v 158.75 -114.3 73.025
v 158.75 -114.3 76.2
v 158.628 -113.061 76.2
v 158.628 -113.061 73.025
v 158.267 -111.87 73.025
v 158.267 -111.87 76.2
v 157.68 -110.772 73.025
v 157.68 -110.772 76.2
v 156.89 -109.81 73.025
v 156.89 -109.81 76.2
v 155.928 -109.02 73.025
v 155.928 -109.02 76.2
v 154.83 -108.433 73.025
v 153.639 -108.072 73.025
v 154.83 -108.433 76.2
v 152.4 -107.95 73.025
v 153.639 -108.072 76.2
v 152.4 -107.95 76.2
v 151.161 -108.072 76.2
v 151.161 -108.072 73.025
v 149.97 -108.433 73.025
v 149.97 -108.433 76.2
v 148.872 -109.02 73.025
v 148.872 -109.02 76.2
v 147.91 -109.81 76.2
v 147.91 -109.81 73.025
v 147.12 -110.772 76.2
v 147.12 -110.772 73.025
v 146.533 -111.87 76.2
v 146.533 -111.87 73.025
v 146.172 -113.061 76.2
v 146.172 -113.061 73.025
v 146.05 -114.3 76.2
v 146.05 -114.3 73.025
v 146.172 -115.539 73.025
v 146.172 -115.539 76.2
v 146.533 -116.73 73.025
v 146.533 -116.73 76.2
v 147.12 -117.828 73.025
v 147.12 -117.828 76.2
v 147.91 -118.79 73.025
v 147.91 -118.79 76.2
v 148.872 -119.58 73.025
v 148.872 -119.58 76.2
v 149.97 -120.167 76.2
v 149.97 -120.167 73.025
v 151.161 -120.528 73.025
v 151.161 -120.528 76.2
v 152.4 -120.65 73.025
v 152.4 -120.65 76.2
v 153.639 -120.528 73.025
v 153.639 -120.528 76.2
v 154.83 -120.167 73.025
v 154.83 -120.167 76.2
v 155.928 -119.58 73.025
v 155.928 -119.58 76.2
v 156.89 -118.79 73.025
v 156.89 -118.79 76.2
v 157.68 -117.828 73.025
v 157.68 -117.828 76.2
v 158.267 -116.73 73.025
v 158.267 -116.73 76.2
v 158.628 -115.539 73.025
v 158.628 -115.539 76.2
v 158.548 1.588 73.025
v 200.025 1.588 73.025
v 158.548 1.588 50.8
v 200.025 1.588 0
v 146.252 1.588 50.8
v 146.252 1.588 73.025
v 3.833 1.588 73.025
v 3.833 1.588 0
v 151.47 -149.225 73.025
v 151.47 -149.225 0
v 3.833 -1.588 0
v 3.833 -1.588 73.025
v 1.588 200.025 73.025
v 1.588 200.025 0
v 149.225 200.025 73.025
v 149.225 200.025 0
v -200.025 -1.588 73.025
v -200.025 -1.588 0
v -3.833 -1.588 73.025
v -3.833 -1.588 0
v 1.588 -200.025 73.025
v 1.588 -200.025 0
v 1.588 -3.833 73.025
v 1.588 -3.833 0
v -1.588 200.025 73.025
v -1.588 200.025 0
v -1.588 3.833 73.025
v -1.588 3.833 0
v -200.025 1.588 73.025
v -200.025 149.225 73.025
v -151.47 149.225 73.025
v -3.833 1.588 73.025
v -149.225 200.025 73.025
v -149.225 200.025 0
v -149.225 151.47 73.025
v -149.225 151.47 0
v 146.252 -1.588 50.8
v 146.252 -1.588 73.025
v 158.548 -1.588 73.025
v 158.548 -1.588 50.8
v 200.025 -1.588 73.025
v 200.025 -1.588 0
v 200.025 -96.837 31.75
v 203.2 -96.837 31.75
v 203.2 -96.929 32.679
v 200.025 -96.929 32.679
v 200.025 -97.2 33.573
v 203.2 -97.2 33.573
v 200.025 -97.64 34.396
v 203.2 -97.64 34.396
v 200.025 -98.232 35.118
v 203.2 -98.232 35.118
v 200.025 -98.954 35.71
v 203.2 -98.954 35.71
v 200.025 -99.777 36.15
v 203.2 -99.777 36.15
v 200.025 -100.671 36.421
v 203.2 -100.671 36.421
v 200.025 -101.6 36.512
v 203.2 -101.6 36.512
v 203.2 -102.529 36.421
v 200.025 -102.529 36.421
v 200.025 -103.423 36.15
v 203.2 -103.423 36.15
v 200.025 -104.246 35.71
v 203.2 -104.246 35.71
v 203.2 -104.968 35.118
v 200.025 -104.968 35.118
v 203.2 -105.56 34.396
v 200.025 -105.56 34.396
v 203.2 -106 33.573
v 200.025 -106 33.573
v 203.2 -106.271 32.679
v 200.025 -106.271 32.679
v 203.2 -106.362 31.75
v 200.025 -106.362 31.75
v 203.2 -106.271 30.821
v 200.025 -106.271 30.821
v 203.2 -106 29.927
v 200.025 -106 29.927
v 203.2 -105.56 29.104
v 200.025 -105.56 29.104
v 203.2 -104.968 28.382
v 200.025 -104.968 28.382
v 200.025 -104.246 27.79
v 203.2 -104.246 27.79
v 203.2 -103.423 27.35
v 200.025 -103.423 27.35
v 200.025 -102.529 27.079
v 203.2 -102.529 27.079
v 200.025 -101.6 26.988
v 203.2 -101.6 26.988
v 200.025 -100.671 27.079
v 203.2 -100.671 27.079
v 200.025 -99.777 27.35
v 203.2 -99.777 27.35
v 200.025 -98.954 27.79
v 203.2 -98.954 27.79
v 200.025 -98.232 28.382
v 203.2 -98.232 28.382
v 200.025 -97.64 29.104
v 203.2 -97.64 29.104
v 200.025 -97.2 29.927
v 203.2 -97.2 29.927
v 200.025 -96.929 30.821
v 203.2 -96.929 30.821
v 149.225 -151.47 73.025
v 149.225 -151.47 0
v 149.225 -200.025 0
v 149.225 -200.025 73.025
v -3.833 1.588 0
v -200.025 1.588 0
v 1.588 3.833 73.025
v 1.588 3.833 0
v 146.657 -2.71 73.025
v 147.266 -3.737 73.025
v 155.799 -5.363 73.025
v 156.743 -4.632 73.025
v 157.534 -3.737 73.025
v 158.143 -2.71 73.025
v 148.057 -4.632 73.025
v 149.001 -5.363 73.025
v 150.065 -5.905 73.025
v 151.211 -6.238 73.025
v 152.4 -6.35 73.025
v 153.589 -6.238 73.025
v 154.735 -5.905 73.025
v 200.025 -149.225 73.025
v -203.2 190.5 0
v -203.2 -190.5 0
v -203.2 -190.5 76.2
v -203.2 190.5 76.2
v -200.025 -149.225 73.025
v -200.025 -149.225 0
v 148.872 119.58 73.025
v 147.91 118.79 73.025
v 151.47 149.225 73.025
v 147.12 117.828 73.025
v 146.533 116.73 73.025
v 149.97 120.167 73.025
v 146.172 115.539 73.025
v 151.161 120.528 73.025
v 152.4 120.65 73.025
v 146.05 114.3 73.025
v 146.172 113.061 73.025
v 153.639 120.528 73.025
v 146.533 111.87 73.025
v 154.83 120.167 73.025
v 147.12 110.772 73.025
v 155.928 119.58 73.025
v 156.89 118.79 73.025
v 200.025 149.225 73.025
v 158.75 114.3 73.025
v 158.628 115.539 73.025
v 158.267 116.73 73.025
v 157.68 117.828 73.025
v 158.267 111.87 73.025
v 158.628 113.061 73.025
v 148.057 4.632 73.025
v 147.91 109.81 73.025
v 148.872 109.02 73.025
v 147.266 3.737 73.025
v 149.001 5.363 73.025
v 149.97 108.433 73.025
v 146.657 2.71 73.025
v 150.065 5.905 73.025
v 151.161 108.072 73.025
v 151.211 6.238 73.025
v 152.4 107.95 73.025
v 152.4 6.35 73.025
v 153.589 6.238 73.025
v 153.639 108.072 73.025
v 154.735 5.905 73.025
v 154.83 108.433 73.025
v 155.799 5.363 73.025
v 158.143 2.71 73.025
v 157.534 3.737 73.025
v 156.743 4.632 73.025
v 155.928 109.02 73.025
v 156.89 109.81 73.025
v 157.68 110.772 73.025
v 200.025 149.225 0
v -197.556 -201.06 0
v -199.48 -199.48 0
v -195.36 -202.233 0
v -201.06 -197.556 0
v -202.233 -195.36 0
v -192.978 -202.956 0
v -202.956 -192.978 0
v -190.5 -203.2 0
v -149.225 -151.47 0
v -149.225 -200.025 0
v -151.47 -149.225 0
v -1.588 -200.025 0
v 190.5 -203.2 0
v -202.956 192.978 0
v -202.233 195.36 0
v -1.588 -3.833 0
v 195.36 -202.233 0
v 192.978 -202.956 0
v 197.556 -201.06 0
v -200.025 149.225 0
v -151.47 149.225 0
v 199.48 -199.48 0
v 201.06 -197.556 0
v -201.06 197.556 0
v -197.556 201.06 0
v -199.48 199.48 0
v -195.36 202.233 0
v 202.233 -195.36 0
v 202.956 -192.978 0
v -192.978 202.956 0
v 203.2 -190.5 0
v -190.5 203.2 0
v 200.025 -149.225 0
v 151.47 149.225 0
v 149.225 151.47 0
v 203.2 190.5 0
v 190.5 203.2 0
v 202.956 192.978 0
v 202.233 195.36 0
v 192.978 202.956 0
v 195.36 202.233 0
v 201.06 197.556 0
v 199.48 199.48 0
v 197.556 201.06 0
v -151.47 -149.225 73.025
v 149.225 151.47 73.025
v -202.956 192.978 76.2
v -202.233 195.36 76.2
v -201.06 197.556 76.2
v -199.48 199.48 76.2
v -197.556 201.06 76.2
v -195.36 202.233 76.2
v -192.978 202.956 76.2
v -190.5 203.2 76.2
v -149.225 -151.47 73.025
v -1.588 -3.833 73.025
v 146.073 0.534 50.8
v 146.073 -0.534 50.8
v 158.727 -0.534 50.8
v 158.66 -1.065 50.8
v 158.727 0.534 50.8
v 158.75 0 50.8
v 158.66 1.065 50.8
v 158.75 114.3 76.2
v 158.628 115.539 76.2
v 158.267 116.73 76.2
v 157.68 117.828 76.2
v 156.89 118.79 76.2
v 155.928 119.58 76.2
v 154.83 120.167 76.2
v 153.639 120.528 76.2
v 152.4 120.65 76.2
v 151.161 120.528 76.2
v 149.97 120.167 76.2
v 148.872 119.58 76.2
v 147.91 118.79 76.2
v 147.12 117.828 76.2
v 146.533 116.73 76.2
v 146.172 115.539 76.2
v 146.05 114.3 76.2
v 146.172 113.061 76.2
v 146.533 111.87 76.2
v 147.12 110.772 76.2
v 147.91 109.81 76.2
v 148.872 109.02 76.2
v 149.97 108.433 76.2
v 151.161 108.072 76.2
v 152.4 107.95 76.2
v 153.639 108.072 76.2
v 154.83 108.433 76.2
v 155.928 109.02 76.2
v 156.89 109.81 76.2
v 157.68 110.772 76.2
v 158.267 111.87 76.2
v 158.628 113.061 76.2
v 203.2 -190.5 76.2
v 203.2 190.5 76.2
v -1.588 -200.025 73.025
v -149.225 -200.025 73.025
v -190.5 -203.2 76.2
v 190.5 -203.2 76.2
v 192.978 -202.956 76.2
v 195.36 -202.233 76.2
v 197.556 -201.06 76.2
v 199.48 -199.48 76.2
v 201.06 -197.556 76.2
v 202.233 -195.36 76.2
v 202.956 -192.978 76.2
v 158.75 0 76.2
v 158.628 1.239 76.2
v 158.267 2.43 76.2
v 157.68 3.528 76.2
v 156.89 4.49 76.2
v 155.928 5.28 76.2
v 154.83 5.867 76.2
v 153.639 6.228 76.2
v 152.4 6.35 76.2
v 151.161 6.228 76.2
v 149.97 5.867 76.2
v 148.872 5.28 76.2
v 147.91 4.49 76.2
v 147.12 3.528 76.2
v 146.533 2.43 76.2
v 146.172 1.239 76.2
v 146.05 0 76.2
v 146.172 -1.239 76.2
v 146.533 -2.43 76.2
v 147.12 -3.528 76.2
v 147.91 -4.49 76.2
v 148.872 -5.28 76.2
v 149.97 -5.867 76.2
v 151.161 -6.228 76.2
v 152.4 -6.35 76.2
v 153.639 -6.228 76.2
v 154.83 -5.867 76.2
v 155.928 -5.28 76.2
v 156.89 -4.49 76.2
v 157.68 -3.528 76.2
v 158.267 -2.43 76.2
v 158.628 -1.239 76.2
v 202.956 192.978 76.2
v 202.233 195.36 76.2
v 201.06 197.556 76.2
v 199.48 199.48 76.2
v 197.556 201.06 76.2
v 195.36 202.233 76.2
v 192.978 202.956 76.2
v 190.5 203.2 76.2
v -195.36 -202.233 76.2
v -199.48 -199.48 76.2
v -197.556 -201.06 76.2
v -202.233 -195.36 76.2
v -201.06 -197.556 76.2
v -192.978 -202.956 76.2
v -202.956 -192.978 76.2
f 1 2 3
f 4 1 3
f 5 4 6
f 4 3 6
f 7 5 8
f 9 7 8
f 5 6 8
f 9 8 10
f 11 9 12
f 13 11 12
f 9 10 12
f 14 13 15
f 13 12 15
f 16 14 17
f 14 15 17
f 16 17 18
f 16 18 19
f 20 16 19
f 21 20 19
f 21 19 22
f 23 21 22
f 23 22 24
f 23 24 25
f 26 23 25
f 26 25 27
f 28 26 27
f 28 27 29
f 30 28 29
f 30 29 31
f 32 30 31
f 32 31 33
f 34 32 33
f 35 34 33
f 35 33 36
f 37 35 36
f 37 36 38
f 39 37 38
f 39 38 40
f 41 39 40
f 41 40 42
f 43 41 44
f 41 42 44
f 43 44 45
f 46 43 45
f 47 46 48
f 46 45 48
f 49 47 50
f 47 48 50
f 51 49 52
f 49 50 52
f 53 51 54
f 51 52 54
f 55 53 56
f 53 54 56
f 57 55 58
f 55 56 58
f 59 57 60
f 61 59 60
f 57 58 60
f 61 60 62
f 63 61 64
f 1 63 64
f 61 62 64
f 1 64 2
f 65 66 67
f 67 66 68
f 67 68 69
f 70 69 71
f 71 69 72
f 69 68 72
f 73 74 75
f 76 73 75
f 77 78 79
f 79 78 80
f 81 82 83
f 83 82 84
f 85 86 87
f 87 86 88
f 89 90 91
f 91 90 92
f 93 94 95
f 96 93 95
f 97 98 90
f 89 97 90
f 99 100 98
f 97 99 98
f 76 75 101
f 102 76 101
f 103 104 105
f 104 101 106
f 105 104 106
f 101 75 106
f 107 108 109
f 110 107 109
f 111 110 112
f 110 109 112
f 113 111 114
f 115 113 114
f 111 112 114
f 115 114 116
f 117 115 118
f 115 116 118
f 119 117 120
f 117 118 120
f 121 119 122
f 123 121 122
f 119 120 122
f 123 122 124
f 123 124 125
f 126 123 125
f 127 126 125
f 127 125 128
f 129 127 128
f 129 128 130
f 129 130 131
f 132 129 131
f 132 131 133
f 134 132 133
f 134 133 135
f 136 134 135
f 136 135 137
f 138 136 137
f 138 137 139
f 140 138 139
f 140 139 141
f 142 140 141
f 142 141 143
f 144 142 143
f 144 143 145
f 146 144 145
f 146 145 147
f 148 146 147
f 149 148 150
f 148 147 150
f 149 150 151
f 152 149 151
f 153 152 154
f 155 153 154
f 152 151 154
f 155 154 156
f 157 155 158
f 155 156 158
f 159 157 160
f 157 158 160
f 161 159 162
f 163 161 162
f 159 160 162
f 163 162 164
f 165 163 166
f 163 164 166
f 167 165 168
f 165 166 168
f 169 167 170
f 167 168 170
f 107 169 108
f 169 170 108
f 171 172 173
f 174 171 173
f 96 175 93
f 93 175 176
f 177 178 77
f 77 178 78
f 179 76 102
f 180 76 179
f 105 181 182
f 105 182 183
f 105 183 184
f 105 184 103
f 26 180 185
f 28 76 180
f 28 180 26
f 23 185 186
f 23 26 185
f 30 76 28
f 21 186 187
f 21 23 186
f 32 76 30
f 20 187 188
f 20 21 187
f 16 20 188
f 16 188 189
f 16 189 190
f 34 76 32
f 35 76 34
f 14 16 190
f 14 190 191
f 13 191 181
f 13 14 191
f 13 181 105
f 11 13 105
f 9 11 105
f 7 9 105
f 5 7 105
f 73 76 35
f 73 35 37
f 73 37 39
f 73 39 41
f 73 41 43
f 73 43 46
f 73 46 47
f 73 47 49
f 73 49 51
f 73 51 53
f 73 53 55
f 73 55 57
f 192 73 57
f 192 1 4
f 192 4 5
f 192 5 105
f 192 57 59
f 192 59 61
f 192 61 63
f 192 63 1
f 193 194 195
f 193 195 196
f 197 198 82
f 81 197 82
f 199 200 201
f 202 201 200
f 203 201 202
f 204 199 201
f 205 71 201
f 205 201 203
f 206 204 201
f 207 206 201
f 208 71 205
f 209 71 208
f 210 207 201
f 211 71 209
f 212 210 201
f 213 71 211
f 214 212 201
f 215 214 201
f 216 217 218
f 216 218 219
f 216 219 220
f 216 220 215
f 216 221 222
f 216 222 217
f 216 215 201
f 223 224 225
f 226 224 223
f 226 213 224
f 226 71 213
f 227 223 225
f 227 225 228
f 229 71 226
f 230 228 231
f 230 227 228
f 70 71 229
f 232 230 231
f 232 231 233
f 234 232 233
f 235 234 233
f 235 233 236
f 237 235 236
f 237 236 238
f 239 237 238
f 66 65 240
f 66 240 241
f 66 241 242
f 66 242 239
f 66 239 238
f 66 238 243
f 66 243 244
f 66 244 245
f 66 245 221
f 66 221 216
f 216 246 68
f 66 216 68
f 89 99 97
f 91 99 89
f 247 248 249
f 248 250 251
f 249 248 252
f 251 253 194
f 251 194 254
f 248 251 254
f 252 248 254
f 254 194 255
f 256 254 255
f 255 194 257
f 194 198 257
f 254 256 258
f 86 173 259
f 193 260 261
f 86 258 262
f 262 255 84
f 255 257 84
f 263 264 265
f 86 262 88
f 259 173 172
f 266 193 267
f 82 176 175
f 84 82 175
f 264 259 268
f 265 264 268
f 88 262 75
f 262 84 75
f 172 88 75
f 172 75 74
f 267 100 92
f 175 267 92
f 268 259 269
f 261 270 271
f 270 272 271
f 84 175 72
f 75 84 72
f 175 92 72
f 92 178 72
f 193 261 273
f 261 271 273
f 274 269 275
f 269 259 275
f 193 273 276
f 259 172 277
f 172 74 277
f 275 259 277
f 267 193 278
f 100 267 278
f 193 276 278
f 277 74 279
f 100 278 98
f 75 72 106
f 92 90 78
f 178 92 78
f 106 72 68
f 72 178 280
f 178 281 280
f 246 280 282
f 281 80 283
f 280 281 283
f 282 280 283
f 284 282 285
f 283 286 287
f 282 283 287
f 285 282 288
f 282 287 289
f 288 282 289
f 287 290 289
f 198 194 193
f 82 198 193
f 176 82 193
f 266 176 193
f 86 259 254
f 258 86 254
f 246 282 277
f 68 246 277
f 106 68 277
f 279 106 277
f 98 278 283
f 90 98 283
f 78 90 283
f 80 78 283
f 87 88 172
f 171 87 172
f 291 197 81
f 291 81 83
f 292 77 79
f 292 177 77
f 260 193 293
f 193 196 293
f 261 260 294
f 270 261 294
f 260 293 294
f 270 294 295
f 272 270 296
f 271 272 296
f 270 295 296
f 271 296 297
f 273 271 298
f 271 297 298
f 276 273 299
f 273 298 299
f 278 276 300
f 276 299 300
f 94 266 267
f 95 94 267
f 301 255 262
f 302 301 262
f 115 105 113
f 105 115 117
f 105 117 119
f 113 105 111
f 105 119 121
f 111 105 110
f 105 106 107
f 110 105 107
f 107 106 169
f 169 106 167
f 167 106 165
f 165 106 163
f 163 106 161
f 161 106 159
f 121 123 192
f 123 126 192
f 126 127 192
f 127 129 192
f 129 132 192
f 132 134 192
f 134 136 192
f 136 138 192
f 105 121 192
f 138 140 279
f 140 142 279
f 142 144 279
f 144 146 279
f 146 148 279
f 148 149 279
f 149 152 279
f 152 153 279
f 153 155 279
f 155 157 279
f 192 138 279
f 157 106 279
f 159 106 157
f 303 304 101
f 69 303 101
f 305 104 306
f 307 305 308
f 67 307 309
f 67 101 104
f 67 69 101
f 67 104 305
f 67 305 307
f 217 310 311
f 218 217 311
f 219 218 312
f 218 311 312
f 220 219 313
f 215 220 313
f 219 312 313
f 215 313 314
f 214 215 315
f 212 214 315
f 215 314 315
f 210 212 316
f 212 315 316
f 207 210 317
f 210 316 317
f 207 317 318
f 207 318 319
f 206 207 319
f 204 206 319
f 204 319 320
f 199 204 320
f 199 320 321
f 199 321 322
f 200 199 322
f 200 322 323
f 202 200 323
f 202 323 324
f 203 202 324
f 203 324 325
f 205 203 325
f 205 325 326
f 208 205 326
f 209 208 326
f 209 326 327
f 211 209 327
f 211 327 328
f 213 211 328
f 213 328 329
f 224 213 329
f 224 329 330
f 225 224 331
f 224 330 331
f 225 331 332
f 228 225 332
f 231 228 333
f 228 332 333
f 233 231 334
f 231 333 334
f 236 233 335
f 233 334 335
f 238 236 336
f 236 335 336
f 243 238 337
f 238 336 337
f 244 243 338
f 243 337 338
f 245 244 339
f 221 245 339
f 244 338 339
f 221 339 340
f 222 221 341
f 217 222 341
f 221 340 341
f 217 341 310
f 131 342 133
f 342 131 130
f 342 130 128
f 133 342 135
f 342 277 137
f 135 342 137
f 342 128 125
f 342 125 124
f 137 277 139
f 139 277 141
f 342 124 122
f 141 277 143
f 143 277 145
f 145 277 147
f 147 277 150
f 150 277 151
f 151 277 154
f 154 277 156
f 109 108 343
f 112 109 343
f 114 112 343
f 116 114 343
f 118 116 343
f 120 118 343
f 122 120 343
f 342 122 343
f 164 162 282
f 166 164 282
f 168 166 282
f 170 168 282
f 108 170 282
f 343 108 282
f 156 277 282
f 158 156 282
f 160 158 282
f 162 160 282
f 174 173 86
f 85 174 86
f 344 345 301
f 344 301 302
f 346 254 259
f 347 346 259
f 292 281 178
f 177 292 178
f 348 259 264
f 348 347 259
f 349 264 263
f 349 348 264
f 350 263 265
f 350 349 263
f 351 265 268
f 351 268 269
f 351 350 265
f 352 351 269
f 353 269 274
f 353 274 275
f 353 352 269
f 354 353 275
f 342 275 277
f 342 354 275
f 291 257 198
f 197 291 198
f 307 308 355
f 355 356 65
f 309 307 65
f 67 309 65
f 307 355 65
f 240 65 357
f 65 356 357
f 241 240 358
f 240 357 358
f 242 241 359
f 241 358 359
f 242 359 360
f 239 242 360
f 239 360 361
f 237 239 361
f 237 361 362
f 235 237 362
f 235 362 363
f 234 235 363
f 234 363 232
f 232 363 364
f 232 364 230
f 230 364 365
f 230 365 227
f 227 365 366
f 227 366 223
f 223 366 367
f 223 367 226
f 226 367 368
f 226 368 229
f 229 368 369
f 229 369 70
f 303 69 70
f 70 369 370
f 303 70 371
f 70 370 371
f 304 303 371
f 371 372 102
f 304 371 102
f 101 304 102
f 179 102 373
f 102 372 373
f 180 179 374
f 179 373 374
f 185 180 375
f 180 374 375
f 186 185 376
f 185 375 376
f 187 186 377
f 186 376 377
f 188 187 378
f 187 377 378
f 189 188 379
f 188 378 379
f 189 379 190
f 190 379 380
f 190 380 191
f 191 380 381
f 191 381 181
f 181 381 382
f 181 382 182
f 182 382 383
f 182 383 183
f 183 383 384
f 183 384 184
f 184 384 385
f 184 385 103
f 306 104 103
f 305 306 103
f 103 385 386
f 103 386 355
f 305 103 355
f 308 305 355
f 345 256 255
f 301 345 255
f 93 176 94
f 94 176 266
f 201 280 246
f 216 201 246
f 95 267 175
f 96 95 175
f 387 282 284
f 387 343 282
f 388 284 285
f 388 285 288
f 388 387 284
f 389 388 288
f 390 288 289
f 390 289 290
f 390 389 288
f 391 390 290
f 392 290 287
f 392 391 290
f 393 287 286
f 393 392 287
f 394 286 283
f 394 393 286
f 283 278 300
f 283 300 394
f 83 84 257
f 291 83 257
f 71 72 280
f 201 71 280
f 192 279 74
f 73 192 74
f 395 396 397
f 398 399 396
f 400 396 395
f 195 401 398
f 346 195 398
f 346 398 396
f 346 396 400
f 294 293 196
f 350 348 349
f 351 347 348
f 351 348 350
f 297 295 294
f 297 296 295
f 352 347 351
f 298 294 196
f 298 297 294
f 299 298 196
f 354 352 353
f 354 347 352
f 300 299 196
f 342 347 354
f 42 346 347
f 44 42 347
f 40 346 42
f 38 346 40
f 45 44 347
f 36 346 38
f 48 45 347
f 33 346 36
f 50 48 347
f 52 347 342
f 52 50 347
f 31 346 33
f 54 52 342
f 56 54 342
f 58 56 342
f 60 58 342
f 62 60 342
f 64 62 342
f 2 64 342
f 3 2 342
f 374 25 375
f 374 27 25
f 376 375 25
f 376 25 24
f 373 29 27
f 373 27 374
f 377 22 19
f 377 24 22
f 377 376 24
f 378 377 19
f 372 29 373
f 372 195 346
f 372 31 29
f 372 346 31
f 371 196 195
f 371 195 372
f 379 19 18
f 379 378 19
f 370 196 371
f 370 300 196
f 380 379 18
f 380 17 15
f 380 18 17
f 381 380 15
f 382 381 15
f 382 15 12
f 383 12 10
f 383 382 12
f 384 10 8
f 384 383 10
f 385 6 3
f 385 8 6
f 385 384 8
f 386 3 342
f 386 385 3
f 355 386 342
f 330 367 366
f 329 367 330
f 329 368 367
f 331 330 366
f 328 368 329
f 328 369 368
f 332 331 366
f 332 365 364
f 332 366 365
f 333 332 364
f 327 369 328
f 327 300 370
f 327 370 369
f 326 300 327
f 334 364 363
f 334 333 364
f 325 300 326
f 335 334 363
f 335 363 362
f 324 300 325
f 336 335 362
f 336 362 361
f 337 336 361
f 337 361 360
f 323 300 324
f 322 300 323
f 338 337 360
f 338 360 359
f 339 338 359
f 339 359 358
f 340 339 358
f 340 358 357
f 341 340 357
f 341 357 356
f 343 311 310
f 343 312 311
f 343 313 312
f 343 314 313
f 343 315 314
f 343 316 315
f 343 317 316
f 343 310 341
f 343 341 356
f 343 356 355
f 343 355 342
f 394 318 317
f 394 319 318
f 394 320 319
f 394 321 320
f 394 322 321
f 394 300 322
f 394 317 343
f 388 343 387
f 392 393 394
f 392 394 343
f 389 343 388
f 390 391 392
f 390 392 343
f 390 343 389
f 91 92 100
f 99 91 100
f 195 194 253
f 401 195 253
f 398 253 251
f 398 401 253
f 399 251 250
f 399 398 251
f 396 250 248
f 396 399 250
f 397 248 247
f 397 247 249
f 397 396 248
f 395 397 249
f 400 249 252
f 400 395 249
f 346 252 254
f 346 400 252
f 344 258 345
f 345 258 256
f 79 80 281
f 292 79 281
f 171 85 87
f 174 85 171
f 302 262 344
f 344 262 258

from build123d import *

# Parameters (mm, degrees)
F0_W     = 406.4
F0_H     = 406.4
F1_DEPTH = 76.2
F2_R     = 12.7
F3_R     = 4.7625
F4_DEPTH = 25.4
F5_R     = 6.35
F6_DEPTH = 25.4
F8_DEPTH = 73.025


with BuildPart() as f1:
    # F0 (on Top) → F1 (new body)
    with BuildSketch(Plane.XY):
        Rectangle(F0_W, F0_H)
    extrude(amount=F1_DEPTH)

    # F2
    f2_edges = [f1.edges().sort_by_distance(p)[0] for p in [
        (203.2, -203.2, 38.1),
        (-203.2, -203.2, 38.1),
        (203.2, 203.2, 38.1),
        (-203.2, 203.2, 38.1),
    ]]
    fillet(f2_edges, radius=F2_R)

    # F3 (on face) → F4 (cut)
    with BuildSketch(Plane.YZ.offset(203.2)):
        with Locations((-101.6, 31.75)):
            Circle(F3_R)
    extrude(amount=-F4_DEPTH, mode=Mode.SUBTRACT)

    # F5 (on face) → F6 (cut)
    with BuildSketch(Plane.XY.offset(76.2)):
        with Locations((152.4, -114.3)):
            Circle(F5_R)
        with Locations((152.4, 0)):
            Circle(F5_R)
        with Locations((152.4, 114.3)):
            Circle(F5_R)
    extrude(amount=-F6_DEPTH, mode=Mode.SUBTRACT)

    # F7 (on face) → F8 (cut)
    with BuildSketch(Plane(origin=(0, 0, 0), x_dir=(1, 0, 0), z_dir=(0, 0, -1))):
        Polygon((200.025, 1.5875), (200.025, 149.225), (151.4700640303, 149.225), (3.8325640303, 1.5875), align=None)
        Polygon((1.5875, 3.8325640303), (149.225, 151.4700640303), (149.225, 200.025), (1.5875, 200.025), align=None)
        Polygon((-1.5875, 200.025), (-149.225, 200.025), (-149.225, 151.4700640303), (-1.5875, 3.8325640303), align=None)
        Polygon((-3.8325640303, 1.5875), (-151.4700640303, 149.225), (-200.025, 149.225), (-200.025, 1.5875), align=None)
        Polygon((-200.025, -1.5875), (-200.025, -149.225), (-151.4700640303, -149.225), (-3.8325640303, -1.5875), align=None)
        Polygon((-1.5875, -3.8325640303), (-149.225, -151.4700640303), (-149.225, -200.025), (-1.5875, -200.025), align=None)
        Polygon((1.5875, -200.025), (149.225, -200.025), (149.225, -151.4700640303), (1.5875, -3.8325640303), align=None)
        Polygon((3.8325640303, -1.5875), (151.4700640303, -149.225), (200.025, -149.225), (200.025, -1.5875), align=None)
    extrude(amount=-F8_DEPTH, mode=Mode.SUBTRACT)


solid = f1.part
